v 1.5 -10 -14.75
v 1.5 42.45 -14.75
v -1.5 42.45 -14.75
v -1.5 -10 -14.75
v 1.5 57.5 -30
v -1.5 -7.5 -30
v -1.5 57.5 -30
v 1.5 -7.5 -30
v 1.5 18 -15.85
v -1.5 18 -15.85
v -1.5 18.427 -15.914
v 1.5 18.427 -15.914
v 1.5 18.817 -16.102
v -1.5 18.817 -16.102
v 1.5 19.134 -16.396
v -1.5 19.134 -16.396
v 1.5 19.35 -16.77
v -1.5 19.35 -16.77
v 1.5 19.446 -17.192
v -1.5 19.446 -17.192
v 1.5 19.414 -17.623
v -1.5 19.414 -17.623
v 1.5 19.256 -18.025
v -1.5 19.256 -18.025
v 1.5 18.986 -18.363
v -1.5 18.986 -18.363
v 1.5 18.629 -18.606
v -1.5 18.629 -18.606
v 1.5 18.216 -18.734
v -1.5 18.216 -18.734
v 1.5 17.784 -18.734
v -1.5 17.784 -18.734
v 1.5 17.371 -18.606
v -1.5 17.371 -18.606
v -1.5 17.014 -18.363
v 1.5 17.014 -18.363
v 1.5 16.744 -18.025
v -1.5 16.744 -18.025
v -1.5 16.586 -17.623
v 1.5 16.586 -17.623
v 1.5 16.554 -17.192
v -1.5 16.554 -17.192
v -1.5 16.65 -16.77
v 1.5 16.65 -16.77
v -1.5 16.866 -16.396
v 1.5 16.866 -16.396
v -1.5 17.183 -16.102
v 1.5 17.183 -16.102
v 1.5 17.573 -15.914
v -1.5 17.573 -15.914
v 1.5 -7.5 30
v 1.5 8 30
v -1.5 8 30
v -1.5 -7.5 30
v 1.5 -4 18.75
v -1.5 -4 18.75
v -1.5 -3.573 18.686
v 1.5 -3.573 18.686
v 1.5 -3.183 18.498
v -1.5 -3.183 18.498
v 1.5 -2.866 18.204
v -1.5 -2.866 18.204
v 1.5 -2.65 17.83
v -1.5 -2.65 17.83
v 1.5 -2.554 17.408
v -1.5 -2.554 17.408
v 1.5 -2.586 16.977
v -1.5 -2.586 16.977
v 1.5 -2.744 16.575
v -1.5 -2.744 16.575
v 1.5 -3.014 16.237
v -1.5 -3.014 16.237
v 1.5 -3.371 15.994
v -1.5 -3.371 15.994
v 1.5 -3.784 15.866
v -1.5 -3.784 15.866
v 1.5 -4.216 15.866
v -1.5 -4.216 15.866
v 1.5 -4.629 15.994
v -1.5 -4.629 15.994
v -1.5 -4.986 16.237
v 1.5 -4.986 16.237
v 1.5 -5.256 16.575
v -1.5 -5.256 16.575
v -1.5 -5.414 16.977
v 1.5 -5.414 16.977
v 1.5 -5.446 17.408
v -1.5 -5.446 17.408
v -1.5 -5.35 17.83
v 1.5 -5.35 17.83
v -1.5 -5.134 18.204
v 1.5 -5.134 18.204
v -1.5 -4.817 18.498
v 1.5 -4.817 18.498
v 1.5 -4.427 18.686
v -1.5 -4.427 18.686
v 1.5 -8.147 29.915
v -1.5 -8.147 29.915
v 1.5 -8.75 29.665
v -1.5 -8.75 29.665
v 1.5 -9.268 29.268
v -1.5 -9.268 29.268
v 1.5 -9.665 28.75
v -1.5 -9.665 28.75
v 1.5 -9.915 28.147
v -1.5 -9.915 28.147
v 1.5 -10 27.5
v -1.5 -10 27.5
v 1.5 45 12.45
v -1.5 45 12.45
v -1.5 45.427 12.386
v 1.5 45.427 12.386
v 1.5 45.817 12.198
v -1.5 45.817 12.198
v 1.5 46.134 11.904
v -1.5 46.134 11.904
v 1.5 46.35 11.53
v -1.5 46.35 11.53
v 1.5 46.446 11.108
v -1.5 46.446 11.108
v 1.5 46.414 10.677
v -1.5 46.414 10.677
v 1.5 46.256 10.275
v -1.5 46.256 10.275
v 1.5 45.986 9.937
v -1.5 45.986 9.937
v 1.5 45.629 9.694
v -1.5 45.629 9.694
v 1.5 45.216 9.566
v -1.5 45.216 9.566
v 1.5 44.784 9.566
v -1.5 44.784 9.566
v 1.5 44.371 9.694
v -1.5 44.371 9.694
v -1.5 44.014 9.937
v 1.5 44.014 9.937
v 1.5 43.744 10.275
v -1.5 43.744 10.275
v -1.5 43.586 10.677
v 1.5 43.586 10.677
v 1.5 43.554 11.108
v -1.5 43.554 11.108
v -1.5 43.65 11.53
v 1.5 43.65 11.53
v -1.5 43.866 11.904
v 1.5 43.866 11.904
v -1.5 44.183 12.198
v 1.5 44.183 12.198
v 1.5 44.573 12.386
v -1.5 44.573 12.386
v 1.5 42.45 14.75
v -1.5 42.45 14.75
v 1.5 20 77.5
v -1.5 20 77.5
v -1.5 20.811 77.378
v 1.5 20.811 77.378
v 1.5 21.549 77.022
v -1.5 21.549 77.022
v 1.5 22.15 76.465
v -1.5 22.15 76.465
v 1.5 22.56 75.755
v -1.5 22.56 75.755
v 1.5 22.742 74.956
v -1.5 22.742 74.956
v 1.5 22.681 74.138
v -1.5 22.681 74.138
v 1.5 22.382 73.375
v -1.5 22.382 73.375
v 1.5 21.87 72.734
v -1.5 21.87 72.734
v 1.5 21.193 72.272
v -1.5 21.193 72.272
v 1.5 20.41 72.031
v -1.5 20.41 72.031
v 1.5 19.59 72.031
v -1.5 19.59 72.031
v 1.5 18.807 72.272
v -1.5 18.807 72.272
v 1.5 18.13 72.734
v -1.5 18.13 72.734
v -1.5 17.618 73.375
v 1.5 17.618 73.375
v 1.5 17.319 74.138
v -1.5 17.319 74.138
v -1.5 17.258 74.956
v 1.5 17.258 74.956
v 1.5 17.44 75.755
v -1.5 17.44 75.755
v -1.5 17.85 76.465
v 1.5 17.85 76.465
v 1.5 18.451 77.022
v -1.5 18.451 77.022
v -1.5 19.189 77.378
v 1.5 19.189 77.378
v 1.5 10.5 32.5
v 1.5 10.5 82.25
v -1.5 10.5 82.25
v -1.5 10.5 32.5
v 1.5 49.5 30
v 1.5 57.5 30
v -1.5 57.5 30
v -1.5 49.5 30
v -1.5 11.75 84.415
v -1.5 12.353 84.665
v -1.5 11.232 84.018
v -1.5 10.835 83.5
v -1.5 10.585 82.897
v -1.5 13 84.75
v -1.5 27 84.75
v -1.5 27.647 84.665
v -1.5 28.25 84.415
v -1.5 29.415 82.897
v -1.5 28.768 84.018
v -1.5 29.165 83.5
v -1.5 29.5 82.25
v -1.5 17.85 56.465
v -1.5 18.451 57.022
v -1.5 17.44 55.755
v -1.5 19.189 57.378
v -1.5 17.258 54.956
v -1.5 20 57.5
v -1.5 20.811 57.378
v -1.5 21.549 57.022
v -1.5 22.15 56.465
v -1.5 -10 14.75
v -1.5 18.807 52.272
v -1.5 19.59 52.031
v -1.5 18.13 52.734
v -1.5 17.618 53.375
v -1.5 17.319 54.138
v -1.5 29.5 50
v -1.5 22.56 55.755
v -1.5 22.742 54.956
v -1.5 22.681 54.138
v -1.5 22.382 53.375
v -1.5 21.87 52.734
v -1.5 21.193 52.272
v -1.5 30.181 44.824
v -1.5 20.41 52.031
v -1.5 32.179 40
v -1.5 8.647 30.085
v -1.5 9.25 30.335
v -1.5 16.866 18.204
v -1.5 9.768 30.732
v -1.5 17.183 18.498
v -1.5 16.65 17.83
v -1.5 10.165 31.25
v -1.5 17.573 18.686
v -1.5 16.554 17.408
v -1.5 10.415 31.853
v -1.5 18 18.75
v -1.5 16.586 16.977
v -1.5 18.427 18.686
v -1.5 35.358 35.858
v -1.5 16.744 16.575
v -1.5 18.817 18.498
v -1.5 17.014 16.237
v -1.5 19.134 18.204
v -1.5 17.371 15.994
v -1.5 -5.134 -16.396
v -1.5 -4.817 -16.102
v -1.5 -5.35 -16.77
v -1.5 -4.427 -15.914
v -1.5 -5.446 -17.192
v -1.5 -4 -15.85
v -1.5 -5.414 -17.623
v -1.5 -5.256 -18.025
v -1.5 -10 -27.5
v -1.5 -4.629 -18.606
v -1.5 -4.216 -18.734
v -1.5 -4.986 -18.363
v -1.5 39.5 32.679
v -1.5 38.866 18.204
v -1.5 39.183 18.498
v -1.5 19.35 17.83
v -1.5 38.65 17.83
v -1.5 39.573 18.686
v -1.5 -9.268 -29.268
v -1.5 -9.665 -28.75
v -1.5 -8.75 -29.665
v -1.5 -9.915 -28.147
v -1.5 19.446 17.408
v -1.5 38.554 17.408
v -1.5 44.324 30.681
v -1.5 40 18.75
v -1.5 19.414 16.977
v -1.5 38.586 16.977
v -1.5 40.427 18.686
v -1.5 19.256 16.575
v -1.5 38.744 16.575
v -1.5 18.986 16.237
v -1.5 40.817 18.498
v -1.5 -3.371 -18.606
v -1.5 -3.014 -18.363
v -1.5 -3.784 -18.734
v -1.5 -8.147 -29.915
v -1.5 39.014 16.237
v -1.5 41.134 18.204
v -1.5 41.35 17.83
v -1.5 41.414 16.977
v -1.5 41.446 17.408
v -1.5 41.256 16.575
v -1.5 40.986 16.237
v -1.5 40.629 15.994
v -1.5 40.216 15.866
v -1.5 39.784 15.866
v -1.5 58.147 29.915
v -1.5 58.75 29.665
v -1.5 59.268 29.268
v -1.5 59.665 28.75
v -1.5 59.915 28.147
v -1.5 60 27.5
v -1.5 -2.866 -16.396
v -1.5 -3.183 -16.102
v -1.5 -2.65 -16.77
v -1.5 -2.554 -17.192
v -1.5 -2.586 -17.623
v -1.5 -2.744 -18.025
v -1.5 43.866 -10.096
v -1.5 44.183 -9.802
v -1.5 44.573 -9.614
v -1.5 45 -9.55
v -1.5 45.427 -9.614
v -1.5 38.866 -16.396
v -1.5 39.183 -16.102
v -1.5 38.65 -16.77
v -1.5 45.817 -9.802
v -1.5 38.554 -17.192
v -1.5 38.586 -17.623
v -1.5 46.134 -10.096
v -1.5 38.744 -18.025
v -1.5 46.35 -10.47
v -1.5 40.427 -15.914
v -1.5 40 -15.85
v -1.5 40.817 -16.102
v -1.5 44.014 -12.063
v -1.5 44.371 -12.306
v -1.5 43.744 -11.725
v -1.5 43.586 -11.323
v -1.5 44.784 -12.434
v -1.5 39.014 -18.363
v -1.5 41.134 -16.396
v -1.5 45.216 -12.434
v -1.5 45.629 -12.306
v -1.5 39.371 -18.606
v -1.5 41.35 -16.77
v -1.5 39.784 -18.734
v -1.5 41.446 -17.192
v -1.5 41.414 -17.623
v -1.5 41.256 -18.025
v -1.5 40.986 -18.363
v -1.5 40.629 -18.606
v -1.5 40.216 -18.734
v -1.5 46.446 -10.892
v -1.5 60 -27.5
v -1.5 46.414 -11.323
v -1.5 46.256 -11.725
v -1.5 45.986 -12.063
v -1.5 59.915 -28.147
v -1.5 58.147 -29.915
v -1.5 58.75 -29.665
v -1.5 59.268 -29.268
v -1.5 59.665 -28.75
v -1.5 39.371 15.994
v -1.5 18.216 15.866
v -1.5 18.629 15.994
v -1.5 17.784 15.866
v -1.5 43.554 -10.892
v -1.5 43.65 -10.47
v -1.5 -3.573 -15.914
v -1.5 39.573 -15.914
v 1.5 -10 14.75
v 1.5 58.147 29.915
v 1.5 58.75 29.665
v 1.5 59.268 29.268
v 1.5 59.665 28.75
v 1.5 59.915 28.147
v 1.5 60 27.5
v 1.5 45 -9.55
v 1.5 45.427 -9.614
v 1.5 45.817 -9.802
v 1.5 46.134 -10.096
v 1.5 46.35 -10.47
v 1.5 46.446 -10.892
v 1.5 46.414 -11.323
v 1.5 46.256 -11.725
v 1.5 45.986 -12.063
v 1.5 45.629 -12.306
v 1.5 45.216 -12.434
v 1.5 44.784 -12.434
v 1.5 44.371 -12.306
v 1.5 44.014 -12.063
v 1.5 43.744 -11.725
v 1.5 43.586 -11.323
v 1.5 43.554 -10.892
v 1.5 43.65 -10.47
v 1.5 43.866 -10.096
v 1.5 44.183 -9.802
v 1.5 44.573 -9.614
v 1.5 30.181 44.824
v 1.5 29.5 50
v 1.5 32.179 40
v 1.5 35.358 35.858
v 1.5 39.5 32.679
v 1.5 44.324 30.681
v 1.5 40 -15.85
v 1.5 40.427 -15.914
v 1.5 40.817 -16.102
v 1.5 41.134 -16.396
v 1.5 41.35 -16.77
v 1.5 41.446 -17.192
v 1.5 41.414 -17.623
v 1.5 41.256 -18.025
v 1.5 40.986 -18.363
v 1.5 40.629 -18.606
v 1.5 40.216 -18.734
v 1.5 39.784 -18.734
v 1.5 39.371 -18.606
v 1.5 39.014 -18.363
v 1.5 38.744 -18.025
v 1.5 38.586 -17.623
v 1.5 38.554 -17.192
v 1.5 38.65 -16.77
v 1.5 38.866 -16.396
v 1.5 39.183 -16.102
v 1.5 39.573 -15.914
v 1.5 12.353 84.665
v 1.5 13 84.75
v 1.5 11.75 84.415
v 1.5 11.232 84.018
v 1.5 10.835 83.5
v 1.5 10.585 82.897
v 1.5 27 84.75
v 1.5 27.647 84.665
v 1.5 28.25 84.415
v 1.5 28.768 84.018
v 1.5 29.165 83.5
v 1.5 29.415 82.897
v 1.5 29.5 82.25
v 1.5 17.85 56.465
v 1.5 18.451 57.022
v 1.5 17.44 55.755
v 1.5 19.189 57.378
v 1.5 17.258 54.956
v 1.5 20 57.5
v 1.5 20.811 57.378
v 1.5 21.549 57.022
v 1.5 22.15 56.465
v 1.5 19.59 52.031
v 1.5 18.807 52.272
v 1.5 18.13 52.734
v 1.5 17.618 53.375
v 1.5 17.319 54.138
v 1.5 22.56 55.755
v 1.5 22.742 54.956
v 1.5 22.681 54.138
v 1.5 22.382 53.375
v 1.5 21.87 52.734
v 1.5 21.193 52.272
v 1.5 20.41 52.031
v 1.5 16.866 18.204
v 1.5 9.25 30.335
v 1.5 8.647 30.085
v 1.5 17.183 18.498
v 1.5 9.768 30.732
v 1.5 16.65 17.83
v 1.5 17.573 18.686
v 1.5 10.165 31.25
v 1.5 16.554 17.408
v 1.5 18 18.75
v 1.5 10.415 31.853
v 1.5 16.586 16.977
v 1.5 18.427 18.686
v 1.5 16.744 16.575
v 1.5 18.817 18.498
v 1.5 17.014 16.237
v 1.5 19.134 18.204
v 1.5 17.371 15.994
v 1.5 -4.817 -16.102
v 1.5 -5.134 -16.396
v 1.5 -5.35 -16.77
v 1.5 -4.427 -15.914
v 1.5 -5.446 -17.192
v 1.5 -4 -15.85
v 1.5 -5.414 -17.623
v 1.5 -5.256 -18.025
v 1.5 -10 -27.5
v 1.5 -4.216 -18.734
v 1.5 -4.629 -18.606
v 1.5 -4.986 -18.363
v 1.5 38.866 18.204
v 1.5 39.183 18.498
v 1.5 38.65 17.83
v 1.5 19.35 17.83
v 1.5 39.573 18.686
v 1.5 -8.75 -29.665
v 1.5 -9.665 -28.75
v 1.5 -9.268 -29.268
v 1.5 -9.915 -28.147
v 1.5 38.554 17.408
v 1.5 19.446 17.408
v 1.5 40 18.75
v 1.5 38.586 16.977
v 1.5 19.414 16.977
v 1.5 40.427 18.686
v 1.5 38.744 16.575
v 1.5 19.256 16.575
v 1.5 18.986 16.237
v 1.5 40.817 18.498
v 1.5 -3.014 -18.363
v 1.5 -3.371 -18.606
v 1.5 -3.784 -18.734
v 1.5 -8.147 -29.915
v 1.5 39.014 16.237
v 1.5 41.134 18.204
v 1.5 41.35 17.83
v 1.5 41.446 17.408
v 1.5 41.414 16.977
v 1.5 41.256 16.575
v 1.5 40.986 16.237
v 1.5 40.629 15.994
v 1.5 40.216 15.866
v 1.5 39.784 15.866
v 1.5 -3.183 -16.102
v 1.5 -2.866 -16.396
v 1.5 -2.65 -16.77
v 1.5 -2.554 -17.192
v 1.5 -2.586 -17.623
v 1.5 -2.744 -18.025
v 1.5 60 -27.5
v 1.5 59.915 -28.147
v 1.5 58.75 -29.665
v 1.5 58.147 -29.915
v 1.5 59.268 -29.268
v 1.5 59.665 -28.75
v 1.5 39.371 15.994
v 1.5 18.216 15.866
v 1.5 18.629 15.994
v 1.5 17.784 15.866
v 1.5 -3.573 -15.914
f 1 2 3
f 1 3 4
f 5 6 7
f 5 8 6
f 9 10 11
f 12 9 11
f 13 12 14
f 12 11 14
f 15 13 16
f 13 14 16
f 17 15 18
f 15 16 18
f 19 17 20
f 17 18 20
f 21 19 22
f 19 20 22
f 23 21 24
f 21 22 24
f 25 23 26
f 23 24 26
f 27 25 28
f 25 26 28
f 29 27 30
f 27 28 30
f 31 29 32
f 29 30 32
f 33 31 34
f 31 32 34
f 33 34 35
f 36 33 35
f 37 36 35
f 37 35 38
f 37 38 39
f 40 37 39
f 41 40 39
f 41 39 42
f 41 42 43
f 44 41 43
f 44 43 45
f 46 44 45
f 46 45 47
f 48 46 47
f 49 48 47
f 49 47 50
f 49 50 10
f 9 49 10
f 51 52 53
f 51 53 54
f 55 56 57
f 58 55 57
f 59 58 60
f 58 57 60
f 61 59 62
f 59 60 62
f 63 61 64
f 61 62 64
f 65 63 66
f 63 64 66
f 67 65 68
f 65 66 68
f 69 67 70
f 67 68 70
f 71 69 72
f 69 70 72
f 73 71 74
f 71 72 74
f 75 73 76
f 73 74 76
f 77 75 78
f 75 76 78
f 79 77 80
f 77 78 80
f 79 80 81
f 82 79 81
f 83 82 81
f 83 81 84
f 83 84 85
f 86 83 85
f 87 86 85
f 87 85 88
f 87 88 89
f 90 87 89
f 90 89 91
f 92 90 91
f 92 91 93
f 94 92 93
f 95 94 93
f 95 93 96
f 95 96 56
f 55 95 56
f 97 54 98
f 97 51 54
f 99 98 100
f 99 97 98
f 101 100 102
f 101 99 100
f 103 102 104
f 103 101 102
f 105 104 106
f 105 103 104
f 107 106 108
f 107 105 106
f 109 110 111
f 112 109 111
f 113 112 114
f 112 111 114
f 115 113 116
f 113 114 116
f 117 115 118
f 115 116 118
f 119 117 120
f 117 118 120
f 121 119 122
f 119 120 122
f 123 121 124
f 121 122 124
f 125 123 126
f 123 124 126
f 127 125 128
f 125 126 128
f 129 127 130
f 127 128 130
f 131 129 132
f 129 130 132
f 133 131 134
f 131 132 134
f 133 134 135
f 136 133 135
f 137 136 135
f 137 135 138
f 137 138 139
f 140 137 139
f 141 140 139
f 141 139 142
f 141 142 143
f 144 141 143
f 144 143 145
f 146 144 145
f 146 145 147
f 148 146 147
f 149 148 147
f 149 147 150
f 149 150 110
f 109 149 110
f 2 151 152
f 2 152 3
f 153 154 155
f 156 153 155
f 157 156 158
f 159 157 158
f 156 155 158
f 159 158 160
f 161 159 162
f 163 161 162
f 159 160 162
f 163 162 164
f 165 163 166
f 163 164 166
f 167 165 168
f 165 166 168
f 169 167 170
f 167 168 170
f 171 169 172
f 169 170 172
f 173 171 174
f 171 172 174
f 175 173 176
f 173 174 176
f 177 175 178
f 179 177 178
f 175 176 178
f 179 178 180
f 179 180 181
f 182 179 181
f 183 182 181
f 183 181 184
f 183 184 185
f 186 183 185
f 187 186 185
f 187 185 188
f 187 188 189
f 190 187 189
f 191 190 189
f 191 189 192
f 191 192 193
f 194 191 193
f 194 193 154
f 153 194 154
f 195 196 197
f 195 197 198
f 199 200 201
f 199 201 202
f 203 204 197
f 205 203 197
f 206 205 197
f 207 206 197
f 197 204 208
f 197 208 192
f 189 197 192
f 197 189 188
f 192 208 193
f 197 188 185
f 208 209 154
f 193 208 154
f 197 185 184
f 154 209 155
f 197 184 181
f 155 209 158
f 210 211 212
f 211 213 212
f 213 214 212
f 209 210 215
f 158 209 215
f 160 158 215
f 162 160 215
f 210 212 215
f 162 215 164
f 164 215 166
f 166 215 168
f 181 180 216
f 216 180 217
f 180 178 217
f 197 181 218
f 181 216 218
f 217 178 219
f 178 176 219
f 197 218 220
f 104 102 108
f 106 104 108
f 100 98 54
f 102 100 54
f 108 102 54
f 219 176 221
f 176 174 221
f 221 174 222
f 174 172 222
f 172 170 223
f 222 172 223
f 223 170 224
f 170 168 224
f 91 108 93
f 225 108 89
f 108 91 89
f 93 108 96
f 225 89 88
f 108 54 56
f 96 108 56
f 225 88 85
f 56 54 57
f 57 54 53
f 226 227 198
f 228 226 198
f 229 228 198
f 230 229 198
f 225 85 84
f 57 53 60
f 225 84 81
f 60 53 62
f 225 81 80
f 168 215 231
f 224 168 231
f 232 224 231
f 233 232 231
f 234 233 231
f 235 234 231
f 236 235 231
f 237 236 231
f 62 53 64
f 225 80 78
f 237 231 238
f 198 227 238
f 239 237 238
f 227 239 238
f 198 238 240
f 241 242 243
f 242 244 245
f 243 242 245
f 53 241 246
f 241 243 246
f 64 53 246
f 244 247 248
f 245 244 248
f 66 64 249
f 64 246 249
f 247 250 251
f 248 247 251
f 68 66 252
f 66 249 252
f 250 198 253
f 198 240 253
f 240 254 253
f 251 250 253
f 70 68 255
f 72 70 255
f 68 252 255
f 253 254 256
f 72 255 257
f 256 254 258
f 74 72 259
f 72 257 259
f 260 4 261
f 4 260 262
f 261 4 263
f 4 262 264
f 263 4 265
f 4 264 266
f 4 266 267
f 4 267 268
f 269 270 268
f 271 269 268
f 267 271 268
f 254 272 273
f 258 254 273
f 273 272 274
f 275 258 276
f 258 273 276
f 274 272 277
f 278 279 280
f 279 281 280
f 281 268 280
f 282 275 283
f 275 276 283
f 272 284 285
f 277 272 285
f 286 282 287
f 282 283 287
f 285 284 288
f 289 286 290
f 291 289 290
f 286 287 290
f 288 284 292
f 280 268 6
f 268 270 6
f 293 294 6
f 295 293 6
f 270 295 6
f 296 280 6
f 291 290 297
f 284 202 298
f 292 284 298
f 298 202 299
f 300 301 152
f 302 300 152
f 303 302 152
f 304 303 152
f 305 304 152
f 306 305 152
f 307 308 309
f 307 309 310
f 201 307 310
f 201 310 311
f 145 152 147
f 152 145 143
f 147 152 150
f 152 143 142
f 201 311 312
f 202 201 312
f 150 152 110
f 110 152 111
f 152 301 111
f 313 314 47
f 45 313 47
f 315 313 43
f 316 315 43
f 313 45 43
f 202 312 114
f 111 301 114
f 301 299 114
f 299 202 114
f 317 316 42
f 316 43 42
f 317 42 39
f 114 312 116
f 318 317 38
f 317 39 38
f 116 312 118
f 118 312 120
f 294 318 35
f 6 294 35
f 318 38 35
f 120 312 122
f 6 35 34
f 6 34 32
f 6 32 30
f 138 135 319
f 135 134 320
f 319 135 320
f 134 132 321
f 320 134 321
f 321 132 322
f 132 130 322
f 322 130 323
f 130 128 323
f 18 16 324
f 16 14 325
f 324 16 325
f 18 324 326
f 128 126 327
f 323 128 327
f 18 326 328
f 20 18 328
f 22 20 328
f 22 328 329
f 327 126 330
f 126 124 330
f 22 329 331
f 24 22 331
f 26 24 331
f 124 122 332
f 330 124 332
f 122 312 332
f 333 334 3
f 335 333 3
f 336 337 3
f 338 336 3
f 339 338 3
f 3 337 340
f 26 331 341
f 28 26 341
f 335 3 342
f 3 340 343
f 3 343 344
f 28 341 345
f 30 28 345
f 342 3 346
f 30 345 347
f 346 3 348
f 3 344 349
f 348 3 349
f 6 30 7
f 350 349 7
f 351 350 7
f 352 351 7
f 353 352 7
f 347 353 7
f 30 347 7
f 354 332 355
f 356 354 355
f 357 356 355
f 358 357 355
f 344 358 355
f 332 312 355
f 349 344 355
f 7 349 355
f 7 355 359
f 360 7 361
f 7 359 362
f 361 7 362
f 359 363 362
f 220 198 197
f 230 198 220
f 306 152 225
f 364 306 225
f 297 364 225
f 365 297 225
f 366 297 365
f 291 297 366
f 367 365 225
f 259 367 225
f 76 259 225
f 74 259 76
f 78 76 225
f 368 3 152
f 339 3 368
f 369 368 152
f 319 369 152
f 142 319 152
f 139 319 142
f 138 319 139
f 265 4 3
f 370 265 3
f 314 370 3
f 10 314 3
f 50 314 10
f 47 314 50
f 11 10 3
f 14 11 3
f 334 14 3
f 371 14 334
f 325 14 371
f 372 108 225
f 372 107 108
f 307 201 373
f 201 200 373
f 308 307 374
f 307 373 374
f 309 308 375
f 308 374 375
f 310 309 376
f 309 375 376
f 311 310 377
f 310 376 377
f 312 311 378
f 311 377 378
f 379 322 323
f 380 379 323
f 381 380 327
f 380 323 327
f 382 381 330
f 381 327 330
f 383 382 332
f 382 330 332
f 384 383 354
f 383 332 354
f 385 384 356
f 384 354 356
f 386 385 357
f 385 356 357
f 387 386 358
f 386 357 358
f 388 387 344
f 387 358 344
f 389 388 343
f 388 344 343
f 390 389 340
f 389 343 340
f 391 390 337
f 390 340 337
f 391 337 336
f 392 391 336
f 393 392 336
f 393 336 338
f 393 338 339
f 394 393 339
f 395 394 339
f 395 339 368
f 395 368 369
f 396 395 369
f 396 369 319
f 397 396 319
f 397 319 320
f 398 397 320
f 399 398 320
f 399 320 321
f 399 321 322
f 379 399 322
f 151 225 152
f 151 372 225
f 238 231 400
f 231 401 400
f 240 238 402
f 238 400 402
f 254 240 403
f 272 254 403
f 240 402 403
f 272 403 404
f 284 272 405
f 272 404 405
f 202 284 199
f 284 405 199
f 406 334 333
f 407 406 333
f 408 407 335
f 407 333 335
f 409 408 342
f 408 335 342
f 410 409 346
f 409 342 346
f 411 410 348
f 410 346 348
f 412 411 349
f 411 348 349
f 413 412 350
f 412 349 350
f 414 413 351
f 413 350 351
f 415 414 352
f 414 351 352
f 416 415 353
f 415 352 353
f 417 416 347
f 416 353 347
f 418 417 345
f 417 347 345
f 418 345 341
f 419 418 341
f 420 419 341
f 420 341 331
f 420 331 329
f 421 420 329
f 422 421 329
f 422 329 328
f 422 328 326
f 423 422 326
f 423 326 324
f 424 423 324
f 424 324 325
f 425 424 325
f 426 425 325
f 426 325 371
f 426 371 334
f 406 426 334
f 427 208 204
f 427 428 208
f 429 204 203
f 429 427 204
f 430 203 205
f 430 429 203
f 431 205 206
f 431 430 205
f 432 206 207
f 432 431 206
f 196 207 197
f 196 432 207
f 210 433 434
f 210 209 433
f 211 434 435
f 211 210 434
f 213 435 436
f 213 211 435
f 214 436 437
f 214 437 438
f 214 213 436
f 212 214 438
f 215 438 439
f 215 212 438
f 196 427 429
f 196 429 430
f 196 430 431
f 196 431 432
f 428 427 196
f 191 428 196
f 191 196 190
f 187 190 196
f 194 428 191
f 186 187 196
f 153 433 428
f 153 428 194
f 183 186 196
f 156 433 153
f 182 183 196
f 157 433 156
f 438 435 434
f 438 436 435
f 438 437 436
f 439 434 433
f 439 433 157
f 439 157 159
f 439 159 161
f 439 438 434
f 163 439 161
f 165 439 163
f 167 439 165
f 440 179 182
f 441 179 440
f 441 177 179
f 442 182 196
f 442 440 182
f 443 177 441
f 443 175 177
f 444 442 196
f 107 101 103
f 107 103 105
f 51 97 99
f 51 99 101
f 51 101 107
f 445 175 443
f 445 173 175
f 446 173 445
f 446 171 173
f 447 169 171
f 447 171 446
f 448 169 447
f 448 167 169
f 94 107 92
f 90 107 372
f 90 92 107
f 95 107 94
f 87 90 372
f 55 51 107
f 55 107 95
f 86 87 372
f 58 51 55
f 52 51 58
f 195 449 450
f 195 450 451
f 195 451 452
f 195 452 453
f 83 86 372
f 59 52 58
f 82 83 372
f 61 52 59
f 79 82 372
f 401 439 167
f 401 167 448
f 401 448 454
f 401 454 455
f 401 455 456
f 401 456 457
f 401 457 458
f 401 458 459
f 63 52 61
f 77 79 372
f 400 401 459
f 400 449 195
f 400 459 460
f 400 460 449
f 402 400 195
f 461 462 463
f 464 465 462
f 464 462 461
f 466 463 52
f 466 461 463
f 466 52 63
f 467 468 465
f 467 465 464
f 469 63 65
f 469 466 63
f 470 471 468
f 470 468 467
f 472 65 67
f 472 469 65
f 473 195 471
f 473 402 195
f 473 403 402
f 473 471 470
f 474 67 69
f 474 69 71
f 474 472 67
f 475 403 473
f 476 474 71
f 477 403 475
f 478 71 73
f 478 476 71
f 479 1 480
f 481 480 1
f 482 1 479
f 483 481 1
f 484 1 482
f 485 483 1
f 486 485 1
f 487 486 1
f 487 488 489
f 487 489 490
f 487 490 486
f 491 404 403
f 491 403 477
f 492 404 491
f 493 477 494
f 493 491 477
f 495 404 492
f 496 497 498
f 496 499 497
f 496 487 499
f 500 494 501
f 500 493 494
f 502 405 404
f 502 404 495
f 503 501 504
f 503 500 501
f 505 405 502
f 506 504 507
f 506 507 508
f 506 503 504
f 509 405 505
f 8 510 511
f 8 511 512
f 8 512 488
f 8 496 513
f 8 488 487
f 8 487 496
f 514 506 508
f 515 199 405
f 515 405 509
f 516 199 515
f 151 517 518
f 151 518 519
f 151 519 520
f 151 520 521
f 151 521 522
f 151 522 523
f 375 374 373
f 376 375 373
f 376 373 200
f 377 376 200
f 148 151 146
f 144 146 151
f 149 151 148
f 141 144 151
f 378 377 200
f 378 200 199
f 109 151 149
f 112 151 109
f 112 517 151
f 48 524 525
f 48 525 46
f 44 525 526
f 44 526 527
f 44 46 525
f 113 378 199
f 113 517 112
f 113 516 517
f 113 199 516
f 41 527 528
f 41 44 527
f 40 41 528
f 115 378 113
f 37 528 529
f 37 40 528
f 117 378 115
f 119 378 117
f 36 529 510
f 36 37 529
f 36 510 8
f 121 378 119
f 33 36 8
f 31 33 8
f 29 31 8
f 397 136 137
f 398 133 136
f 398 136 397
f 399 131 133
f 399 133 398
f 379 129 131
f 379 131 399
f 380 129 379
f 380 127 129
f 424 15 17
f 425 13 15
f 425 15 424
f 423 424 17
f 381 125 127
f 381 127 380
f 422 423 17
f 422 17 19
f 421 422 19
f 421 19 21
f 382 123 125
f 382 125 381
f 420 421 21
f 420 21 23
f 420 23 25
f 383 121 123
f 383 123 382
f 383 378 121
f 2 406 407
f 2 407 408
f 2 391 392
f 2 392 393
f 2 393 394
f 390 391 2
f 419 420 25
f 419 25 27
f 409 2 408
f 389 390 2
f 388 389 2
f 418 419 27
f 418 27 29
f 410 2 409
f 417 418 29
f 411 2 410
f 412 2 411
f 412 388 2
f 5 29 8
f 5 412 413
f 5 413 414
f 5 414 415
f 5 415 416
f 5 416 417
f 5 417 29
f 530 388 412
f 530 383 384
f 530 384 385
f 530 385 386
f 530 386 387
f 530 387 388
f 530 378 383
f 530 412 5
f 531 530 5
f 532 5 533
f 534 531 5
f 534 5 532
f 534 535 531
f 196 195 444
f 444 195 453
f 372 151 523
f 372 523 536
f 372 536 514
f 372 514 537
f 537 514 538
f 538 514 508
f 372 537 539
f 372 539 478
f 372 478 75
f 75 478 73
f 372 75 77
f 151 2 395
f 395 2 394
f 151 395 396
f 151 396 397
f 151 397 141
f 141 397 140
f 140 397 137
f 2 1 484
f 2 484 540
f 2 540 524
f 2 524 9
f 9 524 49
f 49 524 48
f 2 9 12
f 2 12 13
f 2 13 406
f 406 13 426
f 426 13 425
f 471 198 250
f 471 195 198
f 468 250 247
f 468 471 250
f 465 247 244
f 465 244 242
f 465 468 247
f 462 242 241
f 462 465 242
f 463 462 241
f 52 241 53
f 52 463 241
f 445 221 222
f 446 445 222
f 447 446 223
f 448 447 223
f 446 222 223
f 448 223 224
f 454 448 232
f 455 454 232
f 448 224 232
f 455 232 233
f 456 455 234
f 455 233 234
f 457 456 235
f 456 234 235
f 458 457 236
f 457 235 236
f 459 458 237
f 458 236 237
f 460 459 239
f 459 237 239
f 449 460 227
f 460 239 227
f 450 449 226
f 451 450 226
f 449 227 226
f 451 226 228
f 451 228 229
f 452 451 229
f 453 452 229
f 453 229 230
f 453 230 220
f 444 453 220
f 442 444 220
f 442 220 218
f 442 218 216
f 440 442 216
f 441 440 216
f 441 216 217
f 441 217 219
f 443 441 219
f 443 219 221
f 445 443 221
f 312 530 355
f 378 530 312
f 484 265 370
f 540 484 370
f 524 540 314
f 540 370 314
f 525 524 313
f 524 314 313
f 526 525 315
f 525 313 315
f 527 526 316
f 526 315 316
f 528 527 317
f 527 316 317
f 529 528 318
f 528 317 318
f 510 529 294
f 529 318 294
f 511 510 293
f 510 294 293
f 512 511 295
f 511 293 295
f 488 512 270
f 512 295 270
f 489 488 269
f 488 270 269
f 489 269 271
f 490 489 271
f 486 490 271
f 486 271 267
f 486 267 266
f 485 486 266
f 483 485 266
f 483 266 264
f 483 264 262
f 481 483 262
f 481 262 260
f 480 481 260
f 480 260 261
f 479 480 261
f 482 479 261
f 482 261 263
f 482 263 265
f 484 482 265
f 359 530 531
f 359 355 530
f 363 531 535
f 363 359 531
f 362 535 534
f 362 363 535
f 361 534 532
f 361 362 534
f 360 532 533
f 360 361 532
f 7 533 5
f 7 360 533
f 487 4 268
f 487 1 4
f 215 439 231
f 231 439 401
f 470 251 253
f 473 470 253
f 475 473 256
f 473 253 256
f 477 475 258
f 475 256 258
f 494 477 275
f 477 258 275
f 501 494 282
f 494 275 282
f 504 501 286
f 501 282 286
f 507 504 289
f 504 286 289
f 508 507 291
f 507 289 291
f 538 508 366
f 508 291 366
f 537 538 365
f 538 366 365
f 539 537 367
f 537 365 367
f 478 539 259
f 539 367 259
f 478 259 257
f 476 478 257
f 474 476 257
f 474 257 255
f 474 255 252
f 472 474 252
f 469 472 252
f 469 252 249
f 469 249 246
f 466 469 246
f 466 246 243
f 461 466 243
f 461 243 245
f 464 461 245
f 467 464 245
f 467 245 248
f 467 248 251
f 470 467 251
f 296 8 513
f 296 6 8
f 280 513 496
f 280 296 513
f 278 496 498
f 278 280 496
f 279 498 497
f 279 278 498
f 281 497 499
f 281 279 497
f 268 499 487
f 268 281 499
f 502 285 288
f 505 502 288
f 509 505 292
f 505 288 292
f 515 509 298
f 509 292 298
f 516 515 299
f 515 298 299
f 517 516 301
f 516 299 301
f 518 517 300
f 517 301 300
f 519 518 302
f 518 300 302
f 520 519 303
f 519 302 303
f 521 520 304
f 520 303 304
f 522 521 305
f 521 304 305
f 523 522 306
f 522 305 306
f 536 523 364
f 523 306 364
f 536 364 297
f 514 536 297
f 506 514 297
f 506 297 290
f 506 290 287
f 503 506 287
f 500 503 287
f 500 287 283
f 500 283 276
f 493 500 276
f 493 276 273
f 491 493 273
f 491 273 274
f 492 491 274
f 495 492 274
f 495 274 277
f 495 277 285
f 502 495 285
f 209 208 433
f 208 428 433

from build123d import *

# Parameters (mm, degrees)
BOSS_EXTRUDE2_DEPTH        = 1.5
SKETCH11_W                 = 70
SKETCH11_H                 = 19
BOSS_EXTRUDE3_DEPTH        = 1.5
M5_CLEARANCE_HOLE1_D       = 5.5
FILLET1_R                  = 2.5
FILLET2_R                  = 2.5
M2_5_CLEARANCE_HOLE1_D     = 2.9
M2_5_CLEARANCE_HOLE1_DEPTH = 3
FILLET3_R                  = 20


with BuildPart() as part:
    # Sketch8 → Boss-Extrude2 (new, symmetric)
    with BuildSketch(Plane(origin=(0, 0, 0), x_dir=(0, 0, -1), z_dir=(1, 0, 0))):
        Polygon((30, 60), (-30, 60), (-30, -10), (-14.75, -10), (-14.75, 42.45), (14.75, 42.45), (14.75, -10), (30, -10), align=None)
    extrude(amount=BOSS_EXTRUDE2_DEPTH, both=True)

    # Sketch11 → Boss-Extrude3 (add, symmetric)
    with BuildSketch(Plane(origin=(0, 0, 0), x_dir=(0, 0, -1), z_dir=(1, 0, 0))):
        with Locations((-49.75, 20)):
            Rectangle(SKETCH11_W, SKETCH11_H)
    extrude(amount=BOSS_EXTRUDE3_DEPTH, both=True)

    # M5 Clearance Hole1 (through all)
    with Locations(Plane(origin=(1.5, 0, 0), x_dir=(0, 0, -1), z_dir=(1, 0, 0))):
        with Locations((-74.75, 20), (-54.75, 20)):
            Hole(M5_CLEARANCE_HOLE1_D / 2)

    # Fillet1
    fillet1_edges = [part.edges().sort_by_distance(p)[0] for p in [
        (0, 10.5, 84.75),
        (0, 29.5, 84.75),
    ]]
    fillet(fillet1_edges, radius=FILLET1_R)

    # Fillet2
    fillet2_edges = [part.edges().sort_by_distance(p)[0] for p in [
        (0, -10, -30),
        (0, -10, 30),
        (0, 60, 30),
        (0, 60, -30),
        (0, 10.5, 30),
    ]]
    fillet(fillet2_edges, radius=FILLET2_R)

    # M2.5 Clearance Hole1
    with Locations(Plane(origin=(1.5, 0, 0), x_dir=(0, 0, -1), z_dir=(1, 0, 0))):
        with Locations((17.3, 40), (79.72833177, 74.743551237), (17.3, 18), (17.3, -4), (-17.3, -4), (-17.3, 18), (-17.3, 40), (-11, 45), (11, 45)):
            Hole(M2_5_CLEARANCE_HOLE1_D / 2, depth=M2_5_CLEARANCE_HOLE1_DEPTH)

    # Fillet3
    fillet3_edges = [part.edges().sort_by_distance(p)[0] for p in [
        (0, 29.5, 30),
    ]]
    fillet(fillet3_edges, radius=FILLET3_R)


solid = part.part
